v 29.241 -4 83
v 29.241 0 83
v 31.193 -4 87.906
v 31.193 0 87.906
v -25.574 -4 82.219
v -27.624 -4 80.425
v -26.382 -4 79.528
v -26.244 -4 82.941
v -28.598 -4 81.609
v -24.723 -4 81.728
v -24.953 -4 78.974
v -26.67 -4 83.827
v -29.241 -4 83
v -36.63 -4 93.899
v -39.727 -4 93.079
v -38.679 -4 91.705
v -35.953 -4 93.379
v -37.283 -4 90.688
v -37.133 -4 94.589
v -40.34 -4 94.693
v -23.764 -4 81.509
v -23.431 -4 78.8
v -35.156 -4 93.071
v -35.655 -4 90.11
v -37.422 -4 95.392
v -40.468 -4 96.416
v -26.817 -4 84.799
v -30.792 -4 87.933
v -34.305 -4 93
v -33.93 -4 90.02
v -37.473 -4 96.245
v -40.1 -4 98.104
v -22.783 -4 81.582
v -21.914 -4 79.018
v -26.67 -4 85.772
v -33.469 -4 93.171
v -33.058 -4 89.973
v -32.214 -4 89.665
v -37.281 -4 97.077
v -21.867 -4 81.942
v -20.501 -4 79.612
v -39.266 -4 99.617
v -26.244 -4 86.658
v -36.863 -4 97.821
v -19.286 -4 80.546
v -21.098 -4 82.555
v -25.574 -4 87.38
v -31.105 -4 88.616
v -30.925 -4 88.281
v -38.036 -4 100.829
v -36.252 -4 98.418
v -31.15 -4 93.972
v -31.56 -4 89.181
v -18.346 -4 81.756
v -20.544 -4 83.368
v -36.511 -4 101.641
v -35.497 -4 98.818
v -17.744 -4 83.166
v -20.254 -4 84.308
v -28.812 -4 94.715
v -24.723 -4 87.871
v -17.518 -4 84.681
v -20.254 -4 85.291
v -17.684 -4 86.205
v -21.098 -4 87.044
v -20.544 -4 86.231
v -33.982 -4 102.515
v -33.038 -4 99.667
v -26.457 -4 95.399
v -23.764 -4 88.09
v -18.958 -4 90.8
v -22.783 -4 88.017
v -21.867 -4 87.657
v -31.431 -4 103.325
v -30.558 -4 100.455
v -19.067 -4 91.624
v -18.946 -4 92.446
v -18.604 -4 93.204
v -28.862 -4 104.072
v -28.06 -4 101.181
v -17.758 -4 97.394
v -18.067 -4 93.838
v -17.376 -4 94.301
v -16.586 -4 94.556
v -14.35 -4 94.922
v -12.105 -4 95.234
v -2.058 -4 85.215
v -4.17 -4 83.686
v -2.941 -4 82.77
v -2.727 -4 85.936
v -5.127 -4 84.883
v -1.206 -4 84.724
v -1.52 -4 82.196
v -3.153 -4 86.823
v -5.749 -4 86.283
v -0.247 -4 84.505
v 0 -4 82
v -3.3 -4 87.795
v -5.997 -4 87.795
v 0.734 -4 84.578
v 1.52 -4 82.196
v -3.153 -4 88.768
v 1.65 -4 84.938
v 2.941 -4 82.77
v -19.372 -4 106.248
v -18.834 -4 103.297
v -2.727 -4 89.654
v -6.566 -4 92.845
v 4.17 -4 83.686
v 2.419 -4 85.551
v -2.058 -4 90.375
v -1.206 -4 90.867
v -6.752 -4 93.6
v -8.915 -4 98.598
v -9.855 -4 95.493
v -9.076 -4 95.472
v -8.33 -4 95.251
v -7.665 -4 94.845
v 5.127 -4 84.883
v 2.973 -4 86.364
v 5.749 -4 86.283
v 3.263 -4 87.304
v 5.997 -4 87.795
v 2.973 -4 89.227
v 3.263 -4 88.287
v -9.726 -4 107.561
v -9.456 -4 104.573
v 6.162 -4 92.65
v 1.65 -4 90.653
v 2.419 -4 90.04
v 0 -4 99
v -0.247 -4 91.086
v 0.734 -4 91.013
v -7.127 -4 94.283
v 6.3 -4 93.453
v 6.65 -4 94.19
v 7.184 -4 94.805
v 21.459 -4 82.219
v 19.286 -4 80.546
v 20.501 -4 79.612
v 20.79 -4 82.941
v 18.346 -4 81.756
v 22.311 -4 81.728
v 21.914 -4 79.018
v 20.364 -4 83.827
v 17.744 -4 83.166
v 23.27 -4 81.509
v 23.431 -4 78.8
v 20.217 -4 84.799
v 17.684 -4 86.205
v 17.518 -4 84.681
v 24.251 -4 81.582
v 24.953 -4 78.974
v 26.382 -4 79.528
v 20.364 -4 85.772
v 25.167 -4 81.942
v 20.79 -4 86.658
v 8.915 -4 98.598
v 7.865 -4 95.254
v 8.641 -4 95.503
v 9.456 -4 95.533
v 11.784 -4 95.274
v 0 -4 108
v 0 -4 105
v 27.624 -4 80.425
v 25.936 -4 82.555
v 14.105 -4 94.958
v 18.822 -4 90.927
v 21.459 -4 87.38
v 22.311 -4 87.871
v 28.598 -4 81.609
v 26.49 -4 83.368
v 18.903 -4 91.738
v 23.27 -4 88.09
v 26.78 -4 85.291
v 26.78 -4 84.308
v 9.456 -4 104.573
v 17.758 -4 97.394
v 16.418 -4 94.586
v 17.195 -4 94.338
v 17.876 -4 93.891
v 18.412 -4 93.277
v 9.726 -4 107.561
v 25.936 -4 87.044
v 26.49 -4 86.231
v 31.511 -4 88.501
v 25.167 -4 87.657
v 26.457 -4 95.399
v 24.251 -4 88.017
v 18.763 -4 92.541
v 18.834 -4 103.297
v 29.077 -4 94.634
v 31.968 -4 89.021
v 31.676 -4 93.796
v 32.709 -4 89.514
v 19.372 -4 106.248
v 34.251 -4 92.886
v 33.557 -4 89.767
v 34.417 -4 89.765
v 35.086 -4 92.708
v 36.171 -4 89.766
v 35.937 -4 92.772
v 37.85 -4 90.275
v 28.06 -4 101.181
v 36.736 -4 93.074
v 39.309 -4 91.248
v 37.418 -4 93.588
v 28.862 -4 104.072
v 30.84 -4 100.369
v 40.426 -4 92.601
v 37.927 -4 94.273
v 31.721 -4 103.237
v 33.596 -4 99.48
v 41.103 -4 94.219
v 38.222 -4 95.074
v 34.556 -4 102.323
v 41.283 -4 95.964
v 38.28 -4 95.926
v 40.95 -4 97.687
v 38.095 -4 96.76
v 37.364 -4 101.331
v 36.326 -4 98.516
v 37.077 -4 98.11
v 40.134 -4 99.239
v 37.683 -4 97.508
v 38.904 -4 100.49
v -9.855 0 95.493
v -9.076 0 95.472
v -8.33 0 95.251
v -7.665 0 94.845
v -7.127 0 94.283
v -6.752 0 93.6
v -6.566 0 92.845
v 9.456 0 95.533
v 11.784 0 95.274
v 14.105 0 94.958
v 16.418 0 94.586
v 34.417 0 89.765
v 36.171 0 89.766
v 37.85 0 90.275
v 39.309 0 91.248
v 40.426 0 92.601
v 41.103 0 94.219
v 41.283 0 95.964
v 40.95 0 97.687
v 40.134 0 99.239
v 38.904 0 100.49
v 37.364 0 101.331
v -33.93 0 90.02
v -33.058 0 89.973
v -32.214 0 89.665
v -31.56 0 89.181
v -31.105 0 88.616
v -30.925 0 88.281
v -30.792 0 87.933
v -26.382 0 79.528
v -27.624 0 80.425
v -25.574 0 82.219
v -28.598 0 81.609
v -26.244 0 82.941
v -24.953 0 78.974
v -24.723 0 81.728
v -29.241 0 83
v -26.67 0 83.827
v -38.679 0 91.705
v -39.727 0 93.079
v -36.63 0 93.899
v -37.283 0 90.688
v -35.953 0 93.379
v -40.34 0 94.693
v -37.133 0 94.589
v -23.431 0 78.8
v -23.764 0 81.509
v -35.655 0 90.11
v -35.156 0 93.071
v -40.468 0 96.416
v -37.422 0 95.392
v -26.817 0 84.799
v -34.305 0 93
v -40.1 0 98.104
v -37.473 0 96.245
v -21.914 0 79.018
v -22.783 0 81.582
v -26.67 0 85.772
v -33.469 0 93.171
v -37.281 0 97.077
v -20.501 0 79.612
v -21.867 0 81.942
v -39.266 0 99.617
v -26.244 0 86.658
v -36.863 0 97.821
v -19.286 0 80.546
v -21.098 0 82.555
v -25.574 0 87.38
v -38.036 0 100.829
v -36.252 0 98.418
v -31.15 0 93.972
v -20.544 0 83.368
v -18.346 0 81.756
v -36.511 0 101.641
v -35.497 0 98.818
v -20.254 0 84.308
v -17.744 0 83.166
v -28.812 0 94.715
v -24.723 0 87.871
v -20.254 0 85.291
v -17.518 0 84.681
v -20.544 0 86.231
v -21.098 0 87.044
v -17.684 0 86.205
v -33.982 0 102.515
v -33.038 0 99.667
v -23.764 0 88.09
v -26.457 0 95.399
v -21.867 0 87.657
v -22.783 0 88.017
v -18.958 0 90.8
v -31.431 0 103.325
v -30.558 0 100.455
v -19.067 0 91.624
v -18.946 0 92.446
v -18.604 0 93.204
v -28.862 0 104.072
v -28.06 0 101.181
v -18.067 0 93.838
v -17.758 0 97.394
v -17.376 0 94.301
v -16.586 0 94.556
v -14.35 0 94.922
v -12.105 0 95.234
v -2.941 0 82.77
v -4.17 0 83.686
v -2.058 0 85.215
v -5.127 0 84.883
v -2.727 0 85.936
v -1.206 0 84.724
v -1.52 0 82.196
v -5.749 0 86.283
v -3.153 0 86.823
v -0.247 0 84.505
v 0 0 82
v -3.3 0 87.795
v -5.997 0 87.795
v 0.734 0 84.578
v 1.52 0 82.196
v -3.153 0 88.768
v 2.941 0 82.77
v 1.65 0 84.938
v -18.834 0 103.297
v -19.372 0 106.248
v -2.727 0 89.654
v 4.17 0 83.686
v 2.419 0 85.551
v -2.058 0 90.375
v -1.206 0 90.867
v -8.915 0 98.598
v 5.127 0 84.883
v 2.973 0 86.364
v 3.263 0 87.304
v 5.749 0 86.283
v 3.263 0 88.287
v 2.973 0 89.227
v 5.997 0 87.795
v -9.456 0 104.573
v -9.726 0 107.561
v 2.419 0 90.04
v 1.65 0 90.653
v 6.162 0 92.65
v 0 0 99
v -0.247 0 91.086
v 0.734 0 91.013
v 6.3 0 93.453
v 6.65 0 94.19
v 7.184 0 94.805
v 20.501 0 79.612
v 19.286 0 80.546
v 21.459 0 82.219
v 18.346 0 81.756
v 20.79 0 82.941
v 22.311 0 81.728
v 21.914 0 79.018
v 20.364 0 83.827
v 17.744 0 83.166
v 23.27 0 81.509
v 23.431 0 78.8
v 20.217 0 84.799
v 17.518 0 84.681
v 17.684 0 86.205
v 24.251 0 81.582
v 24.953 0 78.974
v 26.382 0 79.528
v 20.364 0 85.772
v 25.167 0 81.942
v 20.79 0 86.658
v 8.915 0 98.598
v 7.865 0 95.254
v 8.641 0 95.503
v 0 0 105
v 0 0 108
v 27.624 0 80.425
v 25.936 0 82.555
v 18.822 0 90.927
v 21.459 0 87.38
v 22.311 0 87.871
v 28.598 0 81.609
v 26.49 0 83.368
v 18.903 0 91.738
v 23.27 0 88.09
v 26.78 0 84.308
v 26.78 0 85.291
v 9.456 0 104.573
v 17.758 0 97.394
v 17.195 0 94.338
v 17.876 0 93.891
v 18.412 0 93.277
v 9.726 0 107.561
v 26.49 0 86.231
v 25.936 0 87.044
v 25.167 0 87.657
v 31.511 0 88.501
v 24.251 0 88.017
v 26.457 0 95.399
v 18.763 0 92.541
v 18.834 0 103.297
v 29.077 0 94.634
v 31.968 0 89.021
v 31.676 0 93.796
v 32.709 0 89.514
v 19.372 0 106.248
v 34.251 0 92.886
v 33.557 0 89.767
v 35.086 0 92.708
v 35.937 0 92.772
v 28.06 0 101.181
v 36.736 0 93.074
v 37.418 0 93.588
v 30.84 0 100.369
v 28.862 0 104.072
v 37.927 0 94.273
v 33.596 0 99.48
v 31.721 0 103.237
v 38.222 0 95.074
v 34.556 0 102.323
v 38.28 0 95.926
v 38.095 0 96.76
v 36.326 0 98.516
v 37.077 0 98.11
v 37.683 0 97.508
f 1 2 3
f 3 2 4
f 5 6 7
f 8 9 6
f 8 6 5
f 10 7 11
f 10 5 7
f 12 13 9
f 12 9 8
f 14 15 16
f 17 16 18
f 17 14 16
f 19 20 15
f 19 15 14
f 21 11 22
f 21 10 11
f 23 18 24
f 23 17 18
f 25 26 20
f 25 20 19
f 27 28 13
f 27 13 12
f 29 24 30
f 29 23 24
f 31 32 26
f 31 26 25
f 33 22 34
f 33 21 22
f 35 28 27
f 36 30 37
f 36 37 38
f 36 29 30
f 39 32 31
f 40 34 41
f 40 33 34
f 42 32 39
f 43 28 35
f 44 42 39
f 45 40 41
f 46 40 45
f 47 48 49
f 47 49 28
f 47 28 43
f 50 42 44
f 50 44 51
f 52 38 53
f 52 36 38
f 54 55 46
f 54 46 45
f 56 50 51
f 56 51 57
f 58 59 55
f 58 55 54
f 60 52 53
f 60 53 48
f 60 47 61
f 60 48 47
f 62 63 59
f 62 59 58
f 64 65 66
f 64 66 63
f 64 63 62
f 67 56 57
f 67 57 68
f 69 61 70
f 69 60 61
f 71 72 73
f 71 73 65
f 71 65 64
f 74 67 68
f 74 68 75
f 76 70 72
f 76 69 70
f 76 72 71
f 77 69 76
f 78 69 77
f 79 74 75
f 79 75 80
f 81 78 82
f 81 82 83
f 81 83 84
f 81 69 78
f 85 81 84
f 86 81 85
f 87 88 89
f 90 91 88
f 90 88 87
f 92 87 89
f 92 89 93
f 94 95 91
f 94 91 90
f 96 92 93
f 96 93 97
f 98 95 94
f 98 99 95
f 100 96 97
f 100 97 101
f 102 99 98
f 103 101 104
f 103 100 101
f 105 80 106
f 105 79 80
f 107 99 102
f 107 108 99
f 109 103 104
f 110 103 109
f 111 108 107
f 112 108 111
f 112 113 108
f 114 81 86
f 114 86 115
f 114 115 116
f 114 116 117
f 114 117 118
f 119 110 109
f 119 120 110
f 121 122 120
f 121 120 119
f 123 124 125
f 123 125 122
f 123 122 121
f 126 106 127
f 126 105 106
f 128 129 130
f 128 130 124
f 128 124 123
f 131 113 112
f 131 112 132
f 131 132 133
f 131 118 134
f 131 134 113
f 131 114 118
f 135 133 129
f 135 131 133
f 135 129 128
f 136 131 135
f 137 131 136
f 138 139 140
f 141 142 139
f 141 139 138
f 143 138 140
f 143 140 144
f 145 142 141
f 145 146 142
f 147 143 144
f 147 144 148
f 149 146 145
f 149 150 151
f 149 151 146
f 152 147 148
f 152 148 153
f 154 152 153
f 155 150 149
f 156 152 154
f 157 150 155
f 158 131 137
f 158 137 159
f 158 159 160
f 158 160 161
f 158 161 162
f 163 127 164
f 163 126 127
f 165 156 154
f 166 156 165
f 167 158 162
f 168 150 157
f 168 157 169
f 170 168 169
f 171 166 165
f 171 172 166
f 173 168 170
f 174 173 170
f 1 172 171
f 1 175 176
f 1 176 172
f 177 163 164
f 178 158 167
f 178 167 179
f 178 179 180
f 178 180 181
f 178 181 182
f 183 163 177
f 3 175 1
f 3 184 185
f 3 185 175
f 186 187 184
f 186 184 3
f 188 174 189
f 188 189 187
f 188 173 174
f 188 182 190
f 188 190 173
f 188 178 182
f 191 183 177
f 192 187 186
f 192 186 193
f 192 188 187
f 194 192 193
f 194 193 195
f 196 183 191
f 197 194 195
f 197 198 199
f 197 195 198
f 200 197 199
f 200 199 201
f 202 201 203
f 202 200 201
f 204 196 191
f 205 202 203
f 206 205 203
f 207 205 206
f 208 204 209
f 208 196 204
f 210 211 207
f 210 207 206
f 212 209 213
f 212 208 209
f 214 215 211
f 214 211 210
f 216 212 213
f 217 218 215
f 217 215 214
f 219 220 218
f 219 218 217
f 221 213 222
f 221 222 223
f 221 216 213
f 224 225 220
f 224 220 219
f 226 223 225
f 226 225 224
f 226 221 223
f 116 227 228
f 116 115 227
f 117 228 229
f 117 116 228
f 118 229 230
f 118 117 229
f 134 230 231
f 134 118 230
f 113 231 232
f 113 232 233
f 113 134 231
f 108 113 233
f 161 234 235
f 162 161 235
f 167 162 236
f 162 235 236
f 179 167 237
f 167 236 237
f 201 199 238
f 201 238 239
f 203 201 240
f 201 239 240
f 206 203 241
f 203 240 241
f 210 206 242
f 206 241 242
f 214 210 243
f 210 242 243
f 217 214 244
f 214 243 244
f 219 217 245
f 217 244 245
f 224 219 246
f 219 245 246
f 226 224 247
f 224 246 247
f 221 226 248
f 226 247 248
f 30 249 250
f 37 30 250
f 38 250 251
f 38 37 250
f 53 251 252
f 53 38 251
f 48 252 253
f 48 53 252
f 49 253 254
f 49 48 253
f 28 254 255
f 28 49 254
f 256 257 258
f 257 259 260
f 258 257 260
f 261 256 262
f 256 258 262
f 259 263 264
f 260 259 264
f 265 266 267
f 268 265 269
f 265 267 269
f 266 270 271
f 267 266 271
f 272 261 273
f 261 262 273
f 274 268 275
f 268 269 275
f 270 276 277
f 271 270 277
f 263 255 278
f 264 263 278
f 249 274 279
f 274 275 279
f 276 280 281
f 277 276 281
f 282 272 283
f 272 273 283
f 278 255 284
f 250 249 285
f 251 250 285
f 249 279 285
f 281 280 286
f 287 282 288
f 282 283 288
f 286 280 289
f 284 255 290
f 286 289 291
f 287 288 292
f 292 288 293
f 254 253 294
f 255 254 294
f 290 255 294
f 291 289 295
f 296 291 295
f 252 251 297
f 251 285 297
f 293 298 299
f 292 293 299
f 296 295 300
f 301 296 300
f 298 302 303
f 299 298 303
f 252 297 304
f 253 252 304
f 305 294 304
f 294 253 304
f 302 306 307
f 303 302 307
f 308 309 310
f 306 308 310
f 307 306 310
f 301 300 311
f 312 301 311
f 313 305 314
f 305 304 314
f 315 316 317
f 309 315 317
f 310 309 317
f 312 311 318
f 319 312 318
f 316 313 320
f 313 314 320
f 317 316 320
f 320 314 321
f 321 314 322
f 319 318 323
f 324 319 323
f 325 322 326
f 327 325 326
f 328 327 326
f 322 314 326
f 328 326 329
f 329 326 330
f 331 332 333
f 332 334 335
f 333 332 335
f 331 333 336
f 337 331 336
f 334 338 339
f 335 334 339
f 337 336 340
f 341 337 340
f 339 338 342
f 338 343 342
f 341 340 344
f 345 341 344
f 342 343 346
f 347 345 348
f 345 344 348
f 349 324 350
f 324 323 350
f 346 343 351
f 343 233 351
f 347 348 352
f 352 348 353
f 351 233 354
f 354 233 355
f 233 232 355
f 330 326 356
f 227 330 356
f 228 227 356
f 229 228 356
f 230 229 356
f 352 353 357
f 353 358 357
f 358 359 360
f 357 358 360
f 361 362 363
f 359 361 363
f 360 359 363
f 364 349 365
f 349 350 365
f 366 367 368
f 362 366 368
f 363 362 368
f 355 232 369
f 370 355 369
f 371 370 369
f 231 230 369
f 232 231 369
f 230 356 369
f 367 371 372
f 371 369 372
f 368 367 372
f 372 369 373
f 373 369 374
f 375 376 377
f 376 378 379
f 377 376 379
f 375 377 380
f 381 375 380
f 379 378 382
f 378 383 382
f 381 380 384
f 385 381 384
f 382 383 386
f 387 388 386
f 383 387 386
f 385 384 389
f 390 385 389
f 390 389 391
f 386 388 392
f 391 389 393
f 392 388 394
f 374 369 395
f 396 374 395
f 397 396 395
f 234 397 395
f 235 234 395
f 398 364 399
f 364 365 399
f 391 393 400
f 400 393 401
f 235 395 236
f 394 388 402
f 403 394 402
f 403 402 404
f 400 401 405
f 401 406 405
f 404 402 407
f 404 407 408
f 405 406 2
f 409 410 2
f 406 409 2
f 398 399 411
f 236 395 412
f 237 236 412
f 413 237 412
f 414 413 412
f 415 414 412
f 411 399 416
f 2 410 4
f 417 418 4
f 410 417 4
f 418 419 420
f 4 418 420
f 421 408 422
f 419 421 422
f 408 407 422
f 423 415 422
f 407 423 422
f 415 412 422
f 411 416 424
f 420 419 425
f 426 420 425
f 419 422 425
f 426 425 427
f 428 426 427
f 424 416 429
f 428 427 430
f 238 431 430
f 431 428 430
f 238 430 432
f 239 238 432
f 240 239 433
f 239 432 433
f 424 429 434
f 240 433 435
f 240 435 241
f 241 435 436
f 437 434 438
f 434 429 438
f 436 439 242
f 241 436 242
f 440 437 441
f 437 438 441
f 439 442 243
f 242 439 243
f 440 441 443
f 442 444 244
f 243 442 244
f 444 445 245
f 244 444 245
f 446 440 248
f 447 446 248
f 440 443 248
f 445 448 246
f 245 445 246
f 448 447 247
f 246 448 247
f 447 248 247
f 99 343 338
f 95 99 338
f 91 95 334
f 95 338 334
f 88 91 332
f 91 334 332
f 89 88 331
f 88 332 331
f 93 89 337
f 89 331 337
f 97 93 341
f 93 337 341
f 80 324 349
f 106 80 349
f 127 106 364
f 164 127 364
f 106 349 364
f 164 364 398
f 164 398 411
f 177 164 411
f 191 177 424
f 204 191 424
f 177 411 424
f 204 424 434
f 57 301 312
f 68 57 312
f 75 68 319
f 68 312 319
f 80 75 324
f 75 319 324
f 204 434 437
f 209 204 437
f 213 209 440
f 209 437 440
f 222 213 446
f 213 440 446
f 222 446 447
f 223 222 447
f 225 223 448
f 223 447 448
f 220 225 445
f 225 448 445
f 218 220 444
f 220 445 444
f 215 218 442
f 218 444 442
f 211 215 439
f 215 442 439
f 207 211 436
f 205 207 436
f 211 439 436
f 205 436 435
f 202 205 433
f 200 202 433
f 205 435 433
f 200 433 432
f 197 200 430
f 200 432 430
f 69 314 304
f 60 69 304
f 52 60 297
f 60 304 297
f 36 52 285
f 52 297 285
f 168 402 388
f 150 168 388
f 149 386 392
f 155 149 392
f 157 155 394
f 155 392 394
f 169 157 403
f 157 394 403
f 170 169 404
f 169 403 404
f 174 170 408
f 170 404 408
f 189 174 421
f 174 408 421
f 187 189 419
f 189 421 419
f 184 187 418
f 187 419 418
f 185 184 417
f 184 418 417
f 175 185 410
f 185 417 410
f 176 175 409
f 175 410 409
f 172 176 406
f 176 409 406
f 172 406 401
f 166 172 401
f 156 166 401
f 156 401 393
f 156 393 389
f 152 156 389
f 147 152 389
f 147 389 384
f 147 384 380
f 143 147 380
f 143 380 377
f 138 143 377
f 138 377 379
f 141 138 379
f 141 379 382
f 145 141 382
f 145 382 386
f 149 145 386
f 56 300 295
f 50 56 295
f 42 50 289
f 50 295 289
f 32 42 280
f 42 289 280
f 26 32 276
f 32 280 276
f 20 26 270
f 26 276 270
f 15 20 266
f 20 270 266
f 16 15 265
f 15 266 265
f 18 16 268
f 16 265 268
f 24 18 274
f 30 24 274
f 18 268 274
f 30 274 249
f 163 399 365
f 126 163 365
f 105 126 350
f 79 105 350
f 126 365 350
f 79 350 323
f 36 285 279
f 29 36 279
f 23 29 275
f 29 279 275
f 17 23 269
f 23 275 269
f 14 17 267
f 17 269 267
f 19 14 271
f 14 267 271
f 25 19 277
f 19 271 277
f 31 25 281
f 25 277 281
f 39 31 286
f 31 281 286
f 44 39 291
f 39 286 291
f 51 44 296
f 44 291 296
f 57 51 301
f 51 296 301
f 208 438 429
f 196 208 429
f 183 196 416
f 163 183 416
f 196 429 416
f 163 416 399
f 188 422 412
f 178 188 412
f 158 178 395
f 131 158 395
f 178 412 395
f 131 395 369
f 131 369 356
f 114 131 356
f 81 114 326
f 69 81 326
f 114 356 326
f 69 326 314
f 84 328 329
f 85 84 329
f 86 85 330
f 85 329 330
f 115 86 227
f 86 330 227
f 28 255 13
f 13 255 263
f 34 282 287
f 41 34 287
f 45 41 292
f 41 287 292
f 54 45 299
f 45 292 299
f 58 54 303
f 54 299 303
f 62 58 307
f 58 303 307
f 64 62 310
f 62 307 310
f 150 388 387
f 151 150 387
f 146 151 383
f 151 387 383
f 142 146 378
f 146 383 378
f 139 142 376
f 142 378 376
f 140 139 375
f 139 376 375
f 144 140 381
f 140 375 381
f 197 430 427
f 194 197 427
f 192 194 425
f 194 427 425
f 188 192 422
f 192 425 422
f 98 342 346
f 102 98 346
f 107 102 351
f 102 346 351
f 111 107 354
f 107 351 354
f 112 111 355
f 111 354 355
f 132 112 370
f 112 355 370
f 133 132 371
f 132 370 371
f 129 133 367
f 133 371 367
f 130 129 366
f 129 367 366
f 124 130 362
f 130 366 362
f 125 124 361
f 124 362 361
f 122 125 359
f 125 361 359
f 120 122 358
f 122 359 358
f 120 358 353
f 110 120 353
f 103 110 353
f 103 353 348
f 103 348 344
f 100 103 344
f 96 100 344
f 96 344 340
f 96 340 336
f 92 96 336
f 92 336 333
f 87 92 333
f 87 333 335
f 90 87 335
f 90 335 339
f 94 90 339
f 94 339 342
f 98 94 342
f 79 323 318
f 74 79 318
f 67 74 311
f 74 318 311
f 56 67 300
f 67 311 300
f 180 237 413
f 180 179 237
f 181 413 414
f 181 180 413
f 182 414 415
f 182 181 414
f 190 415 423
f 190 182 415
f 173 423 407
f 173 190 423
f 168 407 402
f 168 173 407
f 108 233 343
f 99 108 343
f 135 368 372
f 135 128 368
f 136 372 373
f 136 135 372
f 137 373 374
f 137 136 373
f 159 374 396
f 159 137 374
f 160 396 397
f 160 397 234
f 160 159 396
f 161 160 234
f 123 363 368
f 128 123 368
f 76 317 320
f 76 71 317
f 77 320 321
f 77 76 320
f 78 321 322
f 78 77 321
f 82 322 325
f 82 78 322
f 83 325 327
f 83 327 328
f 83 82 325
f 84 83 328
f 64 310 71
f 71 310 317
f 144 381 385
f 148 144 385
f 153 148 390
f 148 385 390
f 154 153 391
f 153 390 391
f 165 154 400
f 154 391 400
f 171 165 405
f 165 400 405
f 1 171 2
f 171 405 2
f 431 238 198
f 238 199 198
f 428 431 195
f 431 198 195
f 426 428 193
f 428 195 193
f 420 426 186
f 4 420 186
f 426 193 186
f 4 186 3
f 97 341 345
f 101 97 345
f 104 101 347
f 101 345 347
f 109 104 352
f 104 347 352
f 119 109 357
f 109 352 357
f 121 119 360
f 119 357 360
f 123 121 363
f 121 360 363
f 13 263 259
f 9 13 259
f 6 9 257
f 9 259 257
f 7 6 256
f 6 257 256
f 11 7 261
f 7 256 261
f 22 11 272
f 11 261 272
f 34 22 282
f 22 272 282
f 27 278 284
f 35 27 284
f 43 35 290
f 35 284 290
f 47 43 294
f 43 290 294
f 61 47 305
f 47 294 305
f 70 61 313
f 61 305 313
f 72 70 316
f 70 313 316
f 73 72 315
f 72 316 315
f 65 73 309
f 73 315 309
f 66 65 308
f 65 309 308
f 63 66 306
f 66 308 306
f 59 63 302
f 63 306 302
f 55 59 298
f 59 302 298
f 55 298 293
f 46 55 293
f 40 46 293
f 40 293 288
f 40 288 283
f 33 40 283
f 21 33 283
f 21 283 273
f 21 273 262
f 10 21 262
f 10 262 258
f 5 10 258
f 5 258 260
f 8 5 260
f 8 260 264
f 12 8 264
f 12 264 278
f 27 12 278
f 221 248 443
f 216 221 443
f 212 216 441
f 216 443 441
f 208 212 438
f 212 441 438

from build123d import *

# Parameters (mm, degrees)
F1_DEPTH = 4
F3_D     = 6.6
F4_R     = 3


with BuildPart() as f1:
    # F0 (on Front) → F1 (new body)
    with BuildSketch(Plane.XZ):
        with BuildLine():
            Line((-33.4687721395, 93.1710324697), (-32.4545669232, 90.3476678494))
            ThreePointArc((-32.4545669232, 90.3476678494), (-32.0483511021, 90.4925587639), (-31.6414884556, 90.6356232853))
            ThreePointArc((-31.6414884556, 90.6356232853), (-28.6634875045, 91.6209827718), (-25.6548841035, 92.508523508))
            Line((-25.6548841035, 92.508523508), (-26.4565992317, 95.3994148677))
            ThreePointArc((-26.4565992318, 95.3994148677), (-29.9833946631, 94.350389742), (-33.4687721395, 93.1710324697))
        make_face()
        with BuildLine():
            ThreePointArc((0, 99), (-13.3502420971, 98.0957238413), (-26.4565992318, 95.3994148677))
            Line((-26.4565992317, 95.3994148677), (-25.6548841035, 92.508523508))
            ThreePointArc((-25.6548841035, 92.508523508), (-22.7517340683, 93.2649912716), (-19.8263642502, 93.9303746432))
            ThreePointArc((-19.8263642502, 93.9303746432), (-13.3908139049, 95.0614859076), (-6.8932268351, 95.7521980103))
            ThreePointArc((-6.8932268351, 95.7521980103), (-3.4488397334, 95.9380295008), (0, 96))
            Line((0, 96), (0, 99))
        make_face()
        with BuildLine():
            ThreePointArc((-19.8263642502, 93.9303746432), (-22.7517340683, 93.2649912716), (-25.6548841035, 92.508523508))
            Line((-25.6548841035, 92.508523508), (-23.5169770949, 84.7994798824))
            ThreePointArc((-23.5169770949, 84.7994798824), (-20.6124161637, 85.5519041278), (-17.6838927225, 86.2048718935))
            Line((-17.6838927225, 86.2048718935), (-19.8263642502, 93.9303746432))
        make_face()
        with BuildLine():
            ThreePointArc((-25.6548841035, 92.508523508), (-28.6634875045, 91.6209827718), (-31.6414884556, 90.6356232853))
            Line((-31.6414884556, 90.6356232853), (-29.240736677, 82.9998754131))
            ThreePointArc((-29.240736677, 82.9998754131), (-26.3941988829, 83.9484738714), (-23.5169770949, 84.7994798824))
            Line((-23.5169770949, 84.7994798824), (-25.6548841035, 92.508523508))
        make_face()
        with BuildLine():
            ThreePointArc((-23.5169770949, 84.7994798824), (-26.3941988829, 83.9484738714), (-29.240736677, 82.9998754131))
            ThreePointArc((-29.240736677, 82.9998754131), (-26.3820624935, 79.5277358011), (-21.9135468384, 79.0176971631))
            Line((-21.9135468384, 79.0176971631), (-23.5169770949, 84.7994798824))
        make_face()
        with BuildLine():
            Line((-23.5169770949, 84.7994798824), (-21.9135468384, 79.0176971631))
            ThreePointArc((-21.9135468384, 79.0176971631), (-18.3459706544, 81.7563413064), (-17.6838927225, 86.2048718935))
            ThreePointArc((-17.6838927225, 86.2048718935), (-20.6124161637, 85.5519041278), (-23.5169770949, 84.7994798824))
        make_face()
        with BuildLine():
            Line((0, 88), (0, 96))
            ThreePointArc((0, 96), (-3.4488397334, 95.9380295008), (-6.8932268351, 95.7521980103))
            Line((-6.8932268351, 95.7521980103), (-5.9965124161, 87.7954545455))
            ThreePointArc((-5.9965124161, 87.7954545455), (-3, 87.9488487702), (0, 88))
        make_face()
        with BuildLine():
            ThreePointArc((6.2693850791, 95.7950667348), (3.1363668039, 95.9487530053), (0, 96))
            Line((0, 96), (0, 88))
            ThreePointArc((0, 88), (3, 87.9488487702), (5.9965124161, 87.7954545455))
            Line((5.9965124161, 87.7954545455), (6.2693850791, 95.7950667348))
        make_face()
        with BuildLine():
            Line((0, 88), (0, 82))
            ThreePointArc((0, 82), (4.1696958686, 83.685647631), (5.9965124161, 87.7954545455))
            ThreePointArc((5.9965124161, 87.7954545455), (3, 87.9488487702), (0, 88))
        make_face()
        with BuildLine():
            ThreePointArc((-5.9965124161, 87.7954545455), (-4.1696958686, 83.685647631), (0, 82))
            Line((0, 82), (0, 88))
            ThreePointArc((0, 88), (-3, 87.9488487702), (-5.9965124161, 87.7954545455))
        make_face()
        with BuildLine():
            ThreePointArc((26.4565992318, 95.3994148677), (13.3502420971, 98.0957238413), (0, 99))
            Line((0, 99), (0, 96))
            ThreePointArc((0, 96), (3.1363668039, 95.9487530053), (6.2693850791, 95.7950667348))
            ThreePointArc((6.2693850791, 95.7950667348), (12.9456893063, 95.1231261491), (19.5587476854, 93.9864638604))
            ThreePointArc((19.5587476854, 93.9864638604), (22.6188903752, 93.2972979147), (25.6548841035, 92.508523508))
            Line((25.6548841035, 92.508523508), (26.4565992317, 95.3994148677))
        make_face()
        with BuildLine():
            Line((-35.4971825722, 98.8177617103), (-36.5113877886, 101.6411263306))
            ThreePointArc((-36.5113877886, 101.6411263306), (-40.1297065965, 93.9659866573), (-32.4545669232, 90.3476678494))
            Line((-32.4545669232, 90.3476678494), (-33.4687721395, 93.1710324697))
            ThreePointArc((-33.4687721395, 93.1710324697), (-37.3063419762, 94.9801918737), (-35.4971825722, 98.8177617103))
        make_face()
        with BuildLine():
            ThreePointArc((-28.8617446165, 104.0720889465), (-32.7091578143, 102.9276979004), (-36.5113877886, 101.6411263306))
            Line((-36.5113877886, 101.6411263306), (-35.4971825722, 98.8177617103))
            ThreePointArc((-35.4971825722, 98.8177617103), (-31.8005700973, 100.068595181), (-28.0600294882, 101.1811975869))
            Line((-28.0600294882, 101.1811975869), (-28.8617446165, 104.0720889465))
        make_face()
        with BuildLine():
            ThreePointArc((0, 108), (-14.5639004696, 107.0135169178), (-28.8617446165, 104.0720889465))
            Line((-28.8617446165, 104.0720889465), (-28.0600294882, 101.1811975869))
            ThreePointArc((-28.0600294882, 101.1811975869), (-14.1593476787, 104.0409192256), (0, 105))
            Line((0, 105), (0, 108))
        make_face()
        with BuildLine():
            ThreePointArc((28.8617446165, 104.0720889465), (14.5639004696, 107.0135169178), (0, 108))
            Line((0, 108), (0, 105))
            ThreePointArc((0, 105), (14.1593476787, 104.0409192256), (28.0600294882, 101.1811975869))
            Line((28.0600294882, 101.1811975869), (28.8617446165, 104.0720889465))
        make_face()
        with BuildLine():
            ThreePointArc((37.3643109139, 101.3306877009), (33.1413854263, 102.789340751), (28.8617446165, 104.0720889465))
            Line((28.8617446165, 104.0720889465), (28.0600294882, 101.1811975869))
            ThreePointArc((28.0600294882, 101.1811975869), (32.2207913867, 99.9340812857), (36.3264133885, 98.5159463758))
            Line((36.3264133885, 98.5159463758), (37.3643109139, 101.3306877009))
        make_face()
        with BuildLine():
            ThreePointArc((33.2127208123, 90.0717224008), (40.9179985132, 93.62541), (37.3643109139, 101.3306877009))
            Line((37.3643109139, 101.3306877009), (36.3264133885, 98.5159463758))
            ThreePointArc((36.3264133885, 98.5159463758), (38.1032571881, 94.6633075254), (34.2506183377, 92.8864637258))
            Line((34.2506183377, 92.8864637258), (33.2127208123, 90.0717224008))
        make_face()
        with BuildLine():
            ThreePointArc((32.2010471833, 90.4383356785), (32.7073976674, 90.2564465167), (33.2127208123, 90.0717224008))
            Line((33.2127208123, 90.0717224008), (34.2506183377, 92.8864637258))
            ThreePointArc((34.2506183377, 92.8864637258), (30.3796033074, 94.2235623551), (26.4565992318, 95.3994148677))
            Line((26.4565992317, 95.3994148677), (25.6548841035, 92.508523508))
            ThreePointArc((25.6548841035, 92.508523508), (28.9464784677, 91.5319691928), (32.2010471833, 90.4383356785))
        make_face()
        with BuildLine():
            ThreePointArc((23.5169770949, 84.7994798824), (26.3941988829, 83.9484738714), (29.240736677, 82.9998754131))
            Line((29.240736677, 82.9998754131), (32.2010471833, 90.4383356785))
            ThreePointArc((32.2010471833, 90.4383356785), (28.9464784677, 91.5319691928), (25.6548841035, 92.508523508))
            Line((25.6548841035, 92.508523508), (23.5169770949, 84.7994798824))
        make_face()
        with BuildLine():
            ThreePointArc((17.6838927225, 86.2048718935), (20.6124161637, 85.5519041278), (23.5169770949, 84.7994798824))
            Line((23.5169770949, 84.7994798824), (25.6548841035, 92.508523508))
            ThreePointArc((25.6548841035, 92.508523508), (22.6188903752, 93.2972979147), (19.5587476854, 93.9864638604))
            Line((19.5587476854, 93.9864638604), (17.6838927225, 86.2048718935))
        make_face()
        with BuildLine():
            ThreePointArc((17.6838927225, 86.2048718935), (18.3459706544, 81.7563413064), (21.9135468384, 79.0176971631))
            Line((21.9135468384, 79.0176971631), (23.5169770949, 84.7994798824))
            ThreePointArc((23.5169770949, 84.7994798824), (20.6124161637, 85.5519041278), (17.6838927225, 86.2048718935))
        make_face()
        with BuildLine():
            Line((23.5169770949, 84.7994798824), (21.9135468384, 79.0176971631))
            ThreePointArc((21.9135468384, 79.0176971631), (26.3820624935, 79.5277358011), (29.240736677, 82.9998754131))
            ThreePointArc((29.240736677, 82.9998754131), (26.3941988829, 83.9484738714), (23.5169770949, 84.7994798824))
        make_face()
    extrude(amount=F1_DEPTH)

    # F3 (through all)
    with Locations(Plane.XZ.offset(4)):
        with Locations((-23.5169770949, 84.7994798824), (0, 87.7954545455), (23.5169770949, 84.7994798824)):
            Hole(F3_D / 2)

    # F4
    f4_edges = [f1.edges().sort_by_distance(p)[0] for p in [
        (-19.826364, -2, 93.930375),
        (6.269385, -2, 95.795067),
        (-31.641488, -2, 90.635623),
        (-6.893227, -2, 95.752198),
        (19.558748, -2, 93.986464),
        (32.201047, -2, 90.438336),
    ]]
    fillet(f4_edges, radius=F4_R)


solid = f1.part
